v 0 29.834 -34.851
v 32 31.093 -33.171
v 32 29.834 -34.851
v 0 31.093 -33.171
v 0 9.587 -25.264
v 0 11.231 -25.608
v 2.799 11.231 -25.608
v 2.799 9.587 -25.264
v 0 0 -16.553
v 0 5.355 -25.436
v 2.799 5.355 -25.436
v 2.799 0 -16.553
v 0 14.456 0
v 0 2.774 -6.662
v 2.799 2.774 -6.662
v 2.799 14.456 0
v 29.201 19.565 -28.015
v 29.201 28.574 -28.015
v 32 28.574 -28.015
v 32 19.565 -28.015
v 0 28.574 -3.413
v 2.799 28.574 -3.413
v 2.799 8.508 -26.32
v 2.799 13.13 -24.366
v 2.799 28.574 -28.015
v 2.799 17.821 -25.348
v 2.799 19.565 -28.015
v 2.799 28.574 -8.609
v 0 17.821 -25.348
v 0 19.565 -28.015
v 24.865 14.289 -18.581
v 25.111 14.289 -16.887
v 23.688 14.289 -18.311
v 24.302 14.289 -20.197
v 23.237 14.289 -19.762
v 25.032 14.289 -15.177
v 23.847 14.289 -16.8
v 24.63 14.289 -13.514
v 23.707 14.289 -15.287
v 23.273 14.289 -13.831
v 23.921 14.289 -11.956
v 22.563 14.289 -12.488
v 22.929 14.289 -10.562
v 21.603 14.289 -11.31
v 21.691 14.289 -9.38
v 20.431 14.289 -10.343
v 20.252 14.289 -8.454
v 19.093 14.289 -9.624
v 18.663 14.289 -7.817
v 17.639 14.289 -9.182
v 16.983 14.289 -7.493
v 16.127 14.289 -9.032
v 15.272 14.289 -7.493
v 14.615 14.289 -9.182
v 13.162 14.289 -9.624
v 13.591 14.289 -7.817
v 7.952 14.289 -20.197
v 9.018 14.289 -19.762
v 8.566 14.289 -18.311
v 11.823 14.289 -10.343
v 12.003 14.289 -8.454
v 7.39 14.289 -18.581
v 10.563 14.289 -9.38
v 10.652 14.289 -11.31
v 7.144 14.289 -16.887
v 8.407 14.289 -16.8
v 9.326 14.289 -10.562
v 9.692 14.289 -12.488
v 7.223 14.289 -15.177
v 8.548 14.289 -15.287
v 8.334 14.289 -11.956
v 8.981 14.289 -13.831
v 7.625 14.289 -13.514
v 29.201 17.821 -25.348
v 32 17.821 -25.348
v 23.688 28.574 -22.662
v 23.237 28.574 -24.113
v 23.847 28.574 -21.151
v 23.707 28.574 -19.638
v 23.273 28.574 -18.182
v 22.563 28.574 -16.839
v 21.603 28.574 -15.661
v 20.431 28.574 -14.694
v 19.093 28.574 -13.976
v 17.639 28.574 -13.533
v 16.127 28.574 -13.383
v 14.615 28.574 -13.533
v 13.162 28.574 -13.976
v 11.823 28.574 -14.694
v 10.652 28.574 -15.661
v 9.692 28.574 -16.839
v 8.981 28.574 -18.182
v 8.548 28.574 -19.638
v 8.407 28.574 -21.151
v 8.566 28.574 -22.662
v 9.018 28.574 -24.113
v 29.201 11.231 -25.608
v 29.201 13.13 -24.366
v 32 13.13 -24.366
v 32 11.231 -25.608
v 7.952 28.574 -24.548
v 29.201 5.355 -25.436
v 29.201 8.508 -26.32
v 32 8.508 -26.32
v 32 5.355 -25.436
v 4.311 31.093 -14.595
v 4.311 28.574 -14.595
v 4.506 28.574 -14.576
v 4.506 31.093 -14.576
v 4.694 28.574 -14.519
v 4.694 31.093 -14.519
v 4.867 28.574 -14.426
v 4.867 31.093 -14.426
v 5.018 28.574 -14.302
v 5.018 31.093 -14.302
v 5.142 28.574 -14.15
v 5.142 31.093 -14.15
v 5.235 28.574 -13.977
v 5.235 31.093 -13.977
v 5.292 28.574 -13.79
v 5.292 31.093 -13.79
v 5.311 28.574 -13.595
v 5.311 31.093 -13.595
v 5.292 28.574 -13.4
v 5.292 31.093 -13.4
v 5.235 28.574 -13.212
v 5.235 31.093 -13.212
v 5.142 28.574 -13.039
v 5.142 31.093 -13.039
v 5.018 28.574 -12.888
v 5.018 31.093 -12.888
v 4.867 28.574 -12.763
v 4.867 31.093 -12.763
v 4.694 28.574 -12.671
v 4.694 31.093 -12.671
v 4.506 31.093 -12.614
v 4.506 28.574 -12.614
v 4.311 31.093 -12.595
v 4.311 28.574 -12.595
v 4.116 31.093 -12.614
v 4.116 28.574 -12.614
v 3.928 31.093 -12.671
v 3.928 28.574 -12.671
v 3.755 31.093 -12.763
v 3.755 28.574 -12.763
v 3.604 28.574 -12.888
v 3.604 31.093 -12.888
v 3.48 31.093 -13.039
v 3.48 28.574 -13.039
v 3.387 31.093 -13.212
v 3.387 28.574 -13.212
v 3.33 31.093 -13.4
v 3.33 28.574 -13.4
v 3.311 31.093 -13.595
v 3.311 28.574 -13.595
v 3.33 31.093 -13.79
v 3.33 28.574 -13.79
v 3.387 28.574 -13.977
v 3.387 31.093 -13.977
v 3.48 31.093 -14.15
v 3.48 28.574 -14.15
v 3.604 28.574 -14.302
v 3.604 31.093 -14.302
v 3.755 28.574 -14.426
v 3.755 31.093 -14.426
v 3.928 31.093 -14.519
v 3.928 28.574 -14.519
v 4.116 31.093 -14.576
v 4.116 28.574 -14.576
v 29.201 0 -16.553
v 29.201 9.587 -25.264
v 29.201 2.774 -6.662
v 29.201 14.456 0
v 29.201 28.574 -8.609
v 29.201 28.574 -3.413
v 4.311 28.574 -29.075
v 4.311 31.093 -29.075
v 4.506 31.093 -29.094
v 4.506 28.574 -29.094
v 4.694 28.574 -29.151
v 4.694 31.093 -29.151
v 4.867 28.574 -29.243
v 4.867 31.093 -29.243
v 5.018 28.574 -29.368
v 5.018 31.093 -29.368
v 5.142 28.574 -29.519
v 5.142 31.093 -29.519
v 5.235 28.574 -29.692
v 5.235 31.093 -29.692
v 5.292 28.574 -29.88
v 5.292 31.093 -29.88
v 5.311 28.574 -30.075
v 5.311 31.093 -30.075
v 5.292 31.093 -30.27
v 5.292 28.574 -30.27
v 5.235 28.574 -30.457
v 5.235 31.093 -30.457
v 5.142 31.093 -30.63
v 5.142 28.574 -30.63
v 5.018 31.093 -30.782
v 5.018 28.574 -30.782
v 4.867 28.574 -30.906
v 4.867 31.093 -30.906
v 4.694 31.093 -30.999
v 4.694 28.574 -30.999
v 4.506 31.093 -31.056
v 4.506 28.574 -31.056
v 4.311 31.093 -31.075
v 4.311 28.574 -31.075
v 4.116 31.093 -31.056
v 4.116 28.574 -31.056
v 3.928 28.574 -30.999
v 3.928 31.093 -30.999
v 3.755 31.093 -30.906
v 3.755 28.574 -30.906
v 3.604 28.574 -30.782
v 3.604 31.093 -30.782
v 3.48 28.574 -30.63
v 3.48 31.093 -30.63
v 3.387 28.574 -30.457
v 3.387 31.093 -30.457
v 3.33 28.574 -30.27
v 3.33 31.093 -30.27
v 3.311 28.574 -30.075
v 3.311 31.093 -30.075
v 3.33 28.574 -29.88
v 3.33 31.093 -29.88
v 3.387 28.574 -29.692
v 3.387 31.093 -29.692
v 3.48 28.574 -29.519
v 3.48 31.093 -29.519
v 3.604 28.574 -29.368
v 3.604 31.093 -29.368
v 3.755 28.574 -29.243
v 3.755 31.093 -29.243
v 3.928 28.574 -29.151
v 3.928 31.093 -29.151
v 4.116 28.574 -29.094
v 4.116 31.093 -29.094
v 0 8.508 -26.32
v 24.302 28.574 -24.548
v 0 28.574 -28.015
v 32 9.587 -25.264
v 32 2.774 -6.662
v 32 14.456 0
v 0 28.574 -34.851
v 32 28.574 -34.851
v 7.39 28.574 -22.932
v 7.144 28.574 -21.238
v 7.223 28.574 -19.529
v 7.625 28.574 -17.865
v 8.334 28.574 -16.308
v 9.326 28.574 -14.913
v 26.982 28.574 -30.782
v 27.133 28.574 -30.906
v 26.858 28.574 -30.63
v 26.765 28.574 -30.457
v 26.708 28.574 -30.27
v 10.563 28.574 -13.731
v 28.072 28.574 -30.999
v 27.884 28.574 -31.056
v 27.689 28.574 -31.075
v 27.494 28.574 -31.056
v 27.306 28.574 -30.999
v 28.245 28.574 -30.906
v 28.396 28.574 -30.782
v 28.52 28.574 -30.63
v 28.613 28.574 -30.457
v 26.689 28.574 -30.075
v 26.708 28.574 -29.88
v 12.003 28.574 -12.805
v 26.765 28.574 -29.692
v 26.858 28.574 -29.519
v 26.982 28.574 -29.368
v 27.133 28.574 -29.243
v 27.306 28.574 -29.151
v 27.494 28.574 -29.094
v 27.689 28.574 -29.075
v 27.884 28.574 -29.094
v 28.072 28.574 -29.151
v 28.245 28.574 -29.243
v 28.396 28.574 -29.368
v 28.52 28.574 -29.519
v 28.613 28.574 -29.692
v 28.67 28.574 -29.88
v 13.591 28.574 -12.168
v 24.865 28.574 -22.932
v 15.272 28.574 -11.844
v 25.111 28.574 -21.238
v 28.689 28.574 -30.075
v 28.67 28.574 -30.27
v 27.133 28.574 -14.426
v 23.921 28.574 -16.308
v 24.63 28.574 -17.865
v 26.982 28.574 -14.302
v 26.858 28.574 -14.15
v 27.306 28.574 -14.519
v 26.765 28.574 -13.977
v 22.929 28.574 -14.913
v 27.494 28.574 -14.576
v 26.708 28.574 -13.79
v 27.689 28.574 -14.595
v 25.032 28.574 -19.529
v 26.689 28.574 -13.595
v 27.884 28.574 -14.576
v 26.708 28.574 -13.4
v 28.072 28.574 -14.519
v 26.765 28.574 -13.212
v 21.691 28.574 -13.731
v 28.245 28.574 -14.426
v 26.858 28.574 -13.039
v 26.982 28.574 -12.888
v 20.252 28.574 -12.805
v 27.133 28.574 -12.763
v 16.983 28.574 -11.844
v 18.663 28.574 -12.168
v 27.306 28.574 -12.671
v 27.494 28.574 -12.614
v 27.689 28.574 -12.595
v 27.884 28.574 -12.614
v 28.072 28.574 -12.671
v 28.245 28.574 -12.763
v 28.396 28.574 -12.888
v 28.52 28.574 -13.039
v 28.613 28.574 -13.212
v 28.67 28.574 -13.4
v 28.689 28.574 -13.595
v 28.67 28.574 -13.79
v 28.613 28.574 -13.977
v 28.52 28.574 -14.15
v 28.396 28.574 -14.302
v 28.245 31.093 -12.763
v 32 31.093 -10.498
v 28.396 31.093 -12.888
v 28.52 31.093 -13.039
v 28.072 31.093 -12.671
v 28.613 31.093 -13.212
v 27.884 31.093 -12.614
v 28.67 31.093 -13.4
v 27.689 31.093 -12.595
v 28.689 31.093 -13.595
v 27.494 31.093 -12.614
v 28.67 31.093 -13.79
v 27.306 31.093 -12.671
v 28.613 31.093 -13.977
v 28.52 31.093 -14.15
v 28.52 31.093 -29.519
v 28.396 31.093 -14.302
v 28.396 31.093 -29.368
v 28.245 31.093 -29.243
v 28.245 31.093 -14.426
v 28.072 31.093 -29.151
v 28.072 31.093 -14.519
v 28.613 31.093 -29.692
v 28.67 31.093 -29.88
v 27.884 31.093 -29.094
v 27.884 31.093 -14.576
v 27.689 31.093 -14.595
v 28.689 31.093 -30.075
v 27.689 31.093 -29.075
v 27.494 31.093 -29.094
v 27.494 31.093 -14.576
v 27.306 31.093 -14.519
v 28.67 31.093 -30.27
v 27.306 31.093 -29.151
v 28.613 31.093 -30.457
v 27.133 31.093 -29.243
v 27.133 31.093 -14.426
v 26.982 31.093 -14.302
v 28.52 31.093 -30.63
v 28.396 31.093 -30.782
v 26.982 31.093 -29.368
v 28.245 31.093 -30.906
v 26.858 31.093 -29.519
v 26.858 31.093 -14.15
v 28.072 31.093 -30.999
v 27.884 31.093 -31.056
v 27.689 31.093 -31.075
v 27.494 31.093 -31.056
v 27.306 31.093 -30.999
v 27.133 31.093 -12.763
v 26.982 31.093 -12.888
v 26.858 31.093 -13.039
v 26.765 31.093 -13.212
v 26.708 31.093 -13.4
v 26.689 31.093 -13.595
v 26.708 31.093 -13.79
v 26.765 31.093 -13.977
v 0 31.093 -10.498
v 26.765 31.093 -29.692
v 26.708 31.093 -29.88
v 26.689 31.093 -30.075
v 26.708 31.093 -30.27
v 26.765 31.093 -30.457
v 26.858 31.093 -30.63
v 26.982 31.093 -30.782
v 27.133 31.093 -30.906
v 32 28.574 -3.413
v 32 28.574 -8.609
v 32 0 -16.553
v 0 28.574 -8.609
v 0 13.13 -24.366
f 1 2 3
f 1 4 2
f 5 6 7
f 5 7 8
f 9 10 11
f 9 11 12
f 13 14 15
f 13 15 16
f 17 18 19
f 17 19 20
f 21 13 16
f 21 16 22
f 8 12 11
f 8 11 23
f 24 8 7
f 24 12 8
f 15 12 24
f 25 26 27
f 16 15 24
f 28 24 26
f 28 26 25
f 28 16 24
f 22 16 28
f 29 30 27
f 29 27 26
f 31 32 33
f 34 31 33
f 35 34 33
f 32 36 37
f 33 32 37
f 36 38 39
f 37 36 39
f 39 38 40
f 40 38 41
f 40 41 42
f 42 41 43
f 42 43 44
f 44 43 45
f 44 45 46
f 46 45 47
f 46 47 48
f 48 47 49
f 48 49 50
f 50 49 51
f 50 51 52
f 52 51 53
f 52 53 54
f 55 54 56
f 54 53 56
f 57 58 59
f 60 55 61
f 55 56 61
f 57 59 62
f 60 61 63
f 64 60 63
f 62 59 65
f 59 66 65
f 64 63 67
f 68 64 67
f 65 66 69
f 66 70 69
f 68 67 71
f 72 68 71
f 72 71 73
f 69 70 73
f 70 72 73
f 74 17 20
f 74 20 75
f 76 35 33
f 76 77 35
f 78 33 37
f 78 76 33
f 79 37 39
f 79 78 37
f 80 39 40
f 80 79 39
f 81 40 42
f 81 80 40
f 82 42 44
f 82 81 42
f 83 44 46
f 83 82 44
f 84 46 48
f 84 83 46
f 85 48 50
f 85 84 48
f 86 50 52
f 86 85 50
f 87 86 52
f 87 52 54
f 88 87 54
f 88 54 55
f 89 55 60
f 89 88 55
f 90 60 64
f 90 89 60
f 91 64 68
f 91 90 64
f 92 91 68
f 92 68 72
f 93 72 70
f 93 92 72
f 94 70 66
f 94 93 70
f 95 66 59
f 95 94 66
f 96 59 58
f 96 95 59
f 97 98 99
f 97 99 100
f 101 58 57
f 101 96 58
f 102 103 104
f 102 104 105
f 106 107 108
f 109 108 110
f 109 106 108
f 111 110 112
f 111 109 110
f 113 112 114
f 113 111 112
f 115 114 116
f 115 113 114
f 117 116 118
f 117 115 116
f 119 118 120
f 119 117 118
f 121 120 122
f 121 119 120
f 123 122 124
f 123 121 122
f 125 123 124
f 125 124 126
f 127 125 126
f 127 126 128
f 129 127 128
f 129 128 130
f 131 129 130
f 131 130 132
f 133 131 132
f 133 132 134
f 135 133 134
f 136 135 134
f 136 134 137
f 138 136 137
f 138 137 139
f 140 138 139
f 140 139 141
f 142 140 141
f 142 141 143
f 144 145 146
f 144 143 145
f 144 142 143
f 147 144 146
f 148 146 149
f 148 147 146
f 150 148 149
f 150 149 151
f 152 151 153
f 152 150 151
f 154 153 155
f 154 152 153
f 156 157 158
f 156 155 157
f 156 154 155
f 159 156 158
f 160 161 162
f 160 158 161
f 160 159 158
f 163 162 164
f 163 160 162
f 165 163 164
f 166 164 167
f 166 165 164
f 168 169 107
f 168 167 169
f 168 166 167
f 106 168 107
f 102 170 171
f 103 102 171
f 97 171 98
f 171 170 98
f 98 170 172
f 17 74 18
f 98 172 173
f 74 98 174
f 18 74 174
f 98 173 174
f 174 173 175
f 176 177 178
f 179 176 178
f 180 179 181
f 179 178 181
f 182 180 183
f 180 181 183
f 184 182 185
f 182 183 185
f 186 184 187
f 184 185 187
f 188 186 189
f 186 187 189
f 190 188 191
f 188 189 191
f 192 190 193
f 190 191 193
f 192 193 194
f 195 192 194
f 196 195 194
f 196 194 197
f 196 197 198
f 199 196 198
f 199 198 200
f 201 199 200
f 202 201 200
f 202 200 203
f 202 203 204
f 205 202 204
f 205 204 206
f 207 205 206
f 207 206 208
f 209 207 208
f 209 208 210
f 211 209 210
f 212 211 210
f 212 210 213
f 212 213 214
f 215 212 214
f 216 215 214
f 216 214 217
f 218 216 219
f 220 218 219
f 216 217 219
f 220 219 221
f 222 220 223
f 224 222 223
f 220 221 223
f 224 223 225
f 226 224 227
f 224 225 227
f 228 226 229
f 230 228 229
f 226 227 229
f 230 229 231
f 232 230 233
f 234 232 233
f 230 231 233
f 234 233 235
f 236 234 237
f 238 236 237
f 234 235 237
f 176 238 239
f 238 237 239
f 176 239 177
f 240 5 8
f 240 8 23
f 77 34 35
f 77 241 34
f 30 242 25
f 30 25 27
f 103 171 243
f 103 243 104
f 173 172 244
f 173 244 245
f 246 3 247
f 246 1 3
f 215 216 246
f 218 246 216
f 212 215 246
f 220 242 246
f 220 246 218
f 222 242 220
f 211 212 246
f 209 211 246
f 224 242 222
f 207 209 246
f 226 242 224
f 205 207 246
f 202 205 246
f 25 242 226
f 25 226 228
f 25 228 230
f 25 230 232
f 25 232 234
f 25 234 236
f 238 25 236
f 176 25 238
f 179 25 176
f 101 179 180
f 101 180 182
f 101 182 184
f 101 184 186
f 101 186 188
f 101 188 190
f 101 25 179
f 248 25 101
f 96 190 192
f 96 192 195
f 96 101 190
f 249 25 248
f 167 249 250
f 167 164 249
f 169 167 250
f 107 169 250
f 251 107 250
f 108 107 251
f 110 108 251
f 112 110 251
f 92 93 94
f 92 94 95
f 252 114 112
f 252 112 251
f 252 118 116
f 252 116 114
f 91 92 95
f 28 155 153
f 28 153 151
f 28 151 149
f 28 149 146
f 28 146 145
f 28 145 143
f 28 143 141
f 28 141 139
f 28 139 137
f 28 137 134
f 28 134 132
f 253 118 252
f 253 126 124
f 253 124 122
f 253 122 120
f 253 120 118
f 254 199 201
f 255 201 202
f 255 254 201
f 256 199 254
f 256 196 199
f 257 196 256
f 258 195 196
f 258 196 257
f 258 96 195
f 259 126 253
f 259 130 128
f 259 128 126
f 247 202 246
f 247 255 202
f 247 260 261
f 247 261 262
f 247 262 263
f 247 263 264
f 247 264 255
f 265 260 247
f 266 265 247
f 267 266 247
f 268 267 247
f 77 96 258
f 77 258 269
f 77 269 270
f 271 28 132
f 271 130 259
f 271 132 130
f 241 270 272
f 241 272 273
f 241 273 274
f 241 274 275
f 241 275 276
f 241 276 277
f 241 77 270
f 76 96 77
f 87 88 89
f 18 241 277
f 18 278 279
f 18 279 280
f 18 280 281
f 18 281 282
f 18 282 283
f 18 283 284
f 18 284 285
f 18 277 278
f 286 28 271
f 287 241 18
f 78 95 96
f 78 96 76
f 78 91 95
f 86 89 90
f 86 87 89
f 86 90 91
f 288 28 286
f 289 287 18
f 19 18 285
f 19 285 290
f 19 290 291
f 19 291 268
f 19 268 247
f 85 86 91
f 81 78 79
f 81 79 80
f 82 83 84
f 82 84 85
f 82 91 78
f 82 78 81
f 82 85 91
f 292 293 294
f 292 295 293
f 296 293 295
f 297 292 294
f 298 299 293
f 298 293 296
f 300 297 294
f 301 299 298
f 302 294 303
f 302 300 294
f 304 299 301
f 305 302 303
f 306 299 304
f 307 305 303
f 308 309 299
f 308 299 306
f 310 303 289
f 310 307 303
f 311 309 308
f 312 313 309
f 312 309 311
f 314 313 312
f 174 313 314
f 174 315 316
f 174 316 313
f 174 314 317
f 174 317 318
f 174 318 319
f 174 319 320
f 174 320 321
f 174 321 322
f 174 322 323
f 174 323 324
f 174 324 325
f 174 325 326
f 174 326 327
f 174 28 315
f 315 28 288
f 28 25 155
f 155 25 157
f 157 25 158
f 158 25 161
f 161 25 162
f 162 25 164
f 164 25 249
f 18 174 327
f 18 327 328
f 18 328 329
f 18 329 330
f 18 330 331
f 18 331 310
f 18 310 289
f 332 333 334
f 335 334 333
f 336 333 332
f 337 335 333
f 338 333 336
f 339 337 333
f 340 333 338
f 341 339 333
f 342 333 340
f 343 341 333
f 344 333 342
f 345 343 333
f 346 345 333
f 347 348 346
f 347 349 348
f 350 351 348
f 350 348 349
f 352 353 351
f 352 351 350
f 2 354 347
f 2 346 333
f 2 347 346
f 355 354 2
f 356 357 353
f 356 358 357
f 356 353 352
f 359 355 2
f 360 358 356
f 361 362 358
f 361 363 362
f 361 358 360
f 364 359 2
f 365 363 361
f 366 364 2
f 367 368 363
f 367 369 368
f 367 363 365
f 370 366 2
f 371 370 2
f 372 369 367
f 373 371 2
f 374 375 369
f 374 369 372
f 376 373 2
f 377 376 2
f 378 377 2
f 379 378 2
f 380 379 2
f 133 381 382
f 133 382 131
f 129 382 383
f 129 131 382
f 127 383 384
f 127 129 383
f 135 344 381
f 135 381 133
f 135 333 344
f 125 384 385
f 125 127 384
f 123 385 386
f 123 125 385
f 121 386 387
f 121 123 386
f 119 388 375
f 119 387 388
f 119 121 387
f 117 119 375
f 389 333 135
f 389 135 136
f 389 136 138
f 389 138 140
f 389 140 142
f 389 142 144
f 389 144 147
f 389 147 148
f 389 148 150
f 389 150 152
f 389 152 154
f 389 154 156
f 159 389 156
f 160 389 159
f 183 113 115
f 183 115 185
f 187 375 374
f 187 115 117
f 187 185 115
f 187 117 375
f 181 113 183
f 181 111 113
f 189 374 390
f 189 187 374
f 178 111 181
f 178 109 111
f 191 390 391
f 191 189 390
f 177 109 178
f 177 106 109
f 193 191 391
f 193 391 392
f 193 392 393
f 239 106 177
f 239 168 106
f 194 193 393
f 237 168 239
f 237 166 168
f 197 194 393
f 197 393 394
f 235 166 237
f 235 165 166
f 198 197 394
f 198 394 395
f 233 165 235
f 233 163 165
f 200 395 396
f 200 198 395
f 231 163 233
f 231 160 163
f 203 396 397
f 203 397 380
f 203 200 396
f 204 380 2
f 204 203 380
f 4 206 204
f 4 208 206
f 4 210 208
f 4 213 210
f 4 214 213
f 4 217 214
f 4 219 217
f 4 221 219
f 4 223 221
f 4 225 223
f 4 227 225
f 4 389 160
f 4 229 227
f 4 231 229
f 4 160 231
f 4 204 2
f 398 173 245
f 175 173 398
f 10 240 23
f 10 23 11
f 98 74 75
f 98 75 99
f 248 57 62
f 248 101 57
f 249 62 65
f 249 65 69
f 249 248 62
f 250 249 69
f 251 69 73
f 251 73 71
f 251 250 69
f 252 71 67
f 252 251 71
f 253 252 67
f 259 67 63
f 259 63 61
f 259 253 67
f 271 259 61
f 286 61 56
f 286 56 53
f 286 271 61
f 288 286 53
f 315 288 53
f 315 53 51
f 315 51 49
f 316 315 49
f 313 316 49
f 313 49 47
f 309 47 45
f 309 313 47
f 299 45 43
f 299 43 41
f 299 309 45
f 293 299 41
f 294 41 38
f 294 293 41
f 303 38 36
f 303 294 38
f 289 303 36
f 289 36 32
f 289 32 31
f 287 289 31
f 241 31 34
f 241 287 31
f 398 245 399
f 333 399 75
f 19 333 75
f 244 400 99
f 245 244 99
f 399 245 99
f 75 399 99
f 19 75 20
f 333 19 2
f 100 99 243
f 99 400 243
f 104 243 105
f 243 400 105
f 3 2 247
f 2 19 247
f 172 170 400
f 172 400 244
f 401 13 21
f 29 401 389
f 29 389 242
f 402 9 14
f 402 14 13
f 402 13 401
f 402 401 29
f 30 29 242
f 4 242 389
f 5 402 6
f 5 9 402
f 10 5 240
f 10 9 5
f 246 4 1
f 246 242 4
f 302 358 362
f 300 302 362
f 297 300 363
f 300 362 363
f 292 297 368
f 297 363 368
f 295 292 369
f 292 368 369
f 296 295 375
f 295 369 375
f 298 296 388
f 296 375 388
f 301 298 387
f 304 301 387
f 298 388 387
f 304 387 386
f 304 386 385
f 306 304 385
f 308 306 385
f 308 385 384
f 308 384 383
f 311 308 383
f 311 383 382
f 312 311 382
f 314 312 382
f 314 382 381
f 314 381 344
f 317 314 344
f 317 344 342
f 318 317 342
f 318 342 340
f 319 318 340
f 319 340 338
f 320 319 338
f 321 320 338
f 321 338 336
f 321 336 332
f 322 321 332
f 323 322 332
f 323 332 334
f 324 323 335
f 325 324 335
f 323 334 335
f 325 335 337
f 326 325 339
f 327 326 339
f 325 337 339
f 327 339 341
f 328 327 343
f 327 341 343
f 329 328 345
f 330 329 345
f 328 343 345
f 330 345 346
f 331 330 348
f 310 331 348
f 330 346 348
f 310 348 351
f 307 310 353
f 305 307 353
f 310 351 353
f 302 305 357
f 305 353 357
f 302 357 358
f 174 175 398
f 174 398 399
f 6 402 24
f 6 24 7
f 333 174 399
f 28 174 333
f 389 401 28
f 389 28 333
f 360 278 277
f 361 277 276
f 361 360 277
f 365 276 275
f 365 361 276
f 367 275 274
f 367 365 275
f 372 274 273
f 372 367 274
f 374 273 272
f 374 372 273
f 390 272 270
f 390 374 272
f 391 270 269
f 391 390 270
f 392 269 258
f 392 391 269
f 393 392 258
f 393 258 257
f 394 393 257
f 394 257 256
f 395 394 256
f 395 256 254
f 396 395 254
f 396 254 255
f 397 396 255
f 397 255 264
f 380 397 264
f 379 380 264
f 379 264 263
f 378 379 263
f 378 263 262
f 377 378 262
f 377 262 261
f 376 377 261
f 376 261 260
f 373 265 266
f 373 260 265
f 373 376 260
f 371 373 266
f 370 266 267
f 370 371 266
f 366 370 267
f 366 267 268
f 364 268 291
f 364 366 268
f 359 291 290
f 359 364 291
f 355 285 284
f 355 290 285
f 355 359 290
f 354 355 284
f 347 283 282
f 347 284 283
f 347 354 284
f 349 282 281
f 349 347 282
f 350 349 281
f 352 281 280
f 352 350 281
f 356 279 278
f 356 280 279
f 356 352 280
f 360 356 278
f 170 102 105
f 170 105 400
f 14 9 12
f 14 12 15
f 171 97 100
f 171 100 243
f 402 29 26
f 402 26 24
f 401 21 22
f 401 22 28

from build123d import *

# Parameters (mm, degrees)
SKETCH3_W               = 26.402815354
SKETCH3_H               = 30.166458461
CUT_EXTRUDE1_DEPTH      = 47
SKETCH4_R               = 1
CUT_EXTRUDE3_DEPTH      = 47
MIRROR4_COPY_1_SKETCH_R = 1
MIRROR4_COPY_1_DEPTH    = 47


with BuildPart() as part:
    # Sketch2 → Loft1 section 0
    with BuildSketch(Plane(origin=(32, 0, 0), x_dir=(0, 0, -1), z_dir=(1, 0, 0))):
        with BuildLine():
            Line((0, 14.455895325), (3.413030344, 28.573993623))
            Line((3.413030344, 28.573993623), (8.608910386, 28.573993623))
            Line((8.608910386, 28.573993623), (10.498321311, 31.093208189))
            Line((10.498321311, 31.093208189), (33.171252407, 31.093208189))
            Line((33.171252407, 31.093208189), (34.850728784, 29.833600906))
            Line((34.850728784, 29.833600906), (34.850728784, 28.573993623))
            Line((34.850728784, 28.573993623), (28.015283486, 28.573993623))
            Line((28.015283486, 28.573993623), (28.015283486, 19.565154633))
            Line((28.015283486, 19.565154633), (25.347572315, 17.820529869))
            Line((25.347572315, 17.820529869), (24.366204042, 13.129607698))
            Line((24.366204042, 13.129607698), (25.607594247, 11.231394061))
            Line((25.607594247, 11.231394061), (25.263551475, 9.586875986))
            Line((25.263551475, 9.586875986), (26.31991204, 8.508154932))
            Line((26.31991204, 8.508154932), (25.435572861, 5.355231962))
            Line((25.435572861, 5.355231962), (16.552703214, 0))
            Line((16.552703214, 0), (6.661783172, 2.774228292))
            Line((6.661783172, 2.774228292), (0, 14.455895325))
        make_face()
    # Sketch1 → Loft1 section 1
    with BuildSketch(Plane(origin=(0, 0, 0), x_dir=(0, 0, -1), z_dir=(1, 0, 0))):
        with BuildLine():
            Line((0, 14.455895325), (3.413030344, 28.573993623))
            Line((3.413030344, 28.573993623), (8.608910386, 28.573993623))
            Line((8.608910386, 28.573993623), (10.498321311, 31.093208189))
            Line((10.498321311, 31.093208189), (33.171252407, 31.093208189))
            Line((33.171252407, 31.093208189), (34.850728784, 29.833600906))
            Line((34.850728784, 29.833600906), (34.850728784, 28.573993623))
            Line((34.850728784, 28.573993623), (28.015283486, 28.573993623))
            Line((28.015283486, 28.573993623), (28.015283486, 19.565154633))
            Line((28.015283486, 19.565154633), (25.347572315, 17.820529869))
            Line((25.347572315, 17.820529869), (24.366204042, 13.129607698))
            Line((24.366204042, 13.129607698), (25.607594247, 11.231394061))
            Line((25.607594247, 11.231394061), (25.263551475, 9.586875986))
            Line((25.263551475, 9.586875986), (26.31991204, 8.508154932))
            Line((26.31991204, 8.508154932), (25.435572861, 5.355231962))
            Line((25.435572861, 5.355231962), (16.552703214, 0))
            Line((16.552703214, 0), (6.661783172, 2.774228292))
            Line((6.661783172, 2.774228292), (0, 14.455895325))
        make_face()
    loft()

    # Sketch3 → Cut-Extrude1 (cut)
    with BuildSketch(Plane.XY):
        with Locations((16, 13.490764393)):
            Rectangle(SKETCH3_W, SKETCH3_H)
    extrude(amount=-CUT_EXTRUDE1_DEPTH, mode=Mode.SUBTRACT)

    # Sketch4 → Cut-Extrude3 (cut)
    with BuildSketch(Plane(origin=(0, 31.093208189, 0), x_dir=(1, 0, 0), z_dir=(0, 1, 0))):
        with Locations((4.311005364, 30.074777425)):
            Circle(SKETCH4_R)
    cut_extrude3 = extrude(amount=-CUT_EXTRUDE3_DEPTH, mode=Mode.SUBTRACT)

    # Mirror3: Cut-Extrude3 across plane
    add(cut_extrude3.mirror(Plane(origin=(16, 0, 0), x_dir=(0, 0, 1), z_dir=(1, 0, 0))), mode=Mode.SUBTRACT)

    # Mirror4: Cut-Extrude3 across plane
    add(cut_extrude3.mirror(Plane.XY.offset(-21.834786859)), mode=Mode.SUBTRACT)

    # Mirror4 copy 1 sketch → Mirror4 copy 1 (cut)
    with BuildSketch(Plane(origin=(32, 31.093208189, -43.669573718), x_dir=(-1, 0, 0), z_dir=(0, 1, 0))):
        with Locations((4.311005364, 30.074777425)):
            Circle(MIRROR4_COPY_1_SKETCH_R)
    extrude(amount=-MIRROR4_COPY_1_DEPTH, mode=Mode.SUBTRACT)

    # Sketch6 → Loft2 section 0
    with BuildSketch(Plane(origin=(0, 14.288993623, 0), x_dir=(-1, 0, 0), z_dir=(0, -1, 0))):
        with BuildLine():
            Line((-9.018092228, 19.761600579), (-7.95240346, 20.196945779))
            ThreePointArc((-7.95240346, 20.196945779), (-16.127321048, 7.452302301), (-24.302238636, 20.196945779))
            Line((-24.302238636, 20.196945779), (-23.236549868, 19.761600579))
            ThreePointArc((-23.236549868, 19.761600579), (-16.127321048, 9.032071449), (-9.018092228, 19.761600579))
        make_face()
    # Sketch5 → Loft2 section 1
    with BuildSketch(Plane(origin=(0, 28.573993623, 0), x_dir=(-1, 0, 0), z_dir=(0, -1, 0))):
        with BuildLine():
            Line((-9.018092228, 24.112821073), (-7.95240346, 24.548166273))
            ThreePointArc((-7.95240346, 24.548166273), (-16.127321048, 11.803522795), (-24.302238636, 24.548166273))
            Line((-24.302238636, 24.548166273), (-23.236549868, 24.112821073))
            ThreePointArc((-23.236549868, 24.112821073), (-16.127321048, 13.383291944), (-9.018092228, 24.112821073))
        make_face()
    loft()


solid = part.part
